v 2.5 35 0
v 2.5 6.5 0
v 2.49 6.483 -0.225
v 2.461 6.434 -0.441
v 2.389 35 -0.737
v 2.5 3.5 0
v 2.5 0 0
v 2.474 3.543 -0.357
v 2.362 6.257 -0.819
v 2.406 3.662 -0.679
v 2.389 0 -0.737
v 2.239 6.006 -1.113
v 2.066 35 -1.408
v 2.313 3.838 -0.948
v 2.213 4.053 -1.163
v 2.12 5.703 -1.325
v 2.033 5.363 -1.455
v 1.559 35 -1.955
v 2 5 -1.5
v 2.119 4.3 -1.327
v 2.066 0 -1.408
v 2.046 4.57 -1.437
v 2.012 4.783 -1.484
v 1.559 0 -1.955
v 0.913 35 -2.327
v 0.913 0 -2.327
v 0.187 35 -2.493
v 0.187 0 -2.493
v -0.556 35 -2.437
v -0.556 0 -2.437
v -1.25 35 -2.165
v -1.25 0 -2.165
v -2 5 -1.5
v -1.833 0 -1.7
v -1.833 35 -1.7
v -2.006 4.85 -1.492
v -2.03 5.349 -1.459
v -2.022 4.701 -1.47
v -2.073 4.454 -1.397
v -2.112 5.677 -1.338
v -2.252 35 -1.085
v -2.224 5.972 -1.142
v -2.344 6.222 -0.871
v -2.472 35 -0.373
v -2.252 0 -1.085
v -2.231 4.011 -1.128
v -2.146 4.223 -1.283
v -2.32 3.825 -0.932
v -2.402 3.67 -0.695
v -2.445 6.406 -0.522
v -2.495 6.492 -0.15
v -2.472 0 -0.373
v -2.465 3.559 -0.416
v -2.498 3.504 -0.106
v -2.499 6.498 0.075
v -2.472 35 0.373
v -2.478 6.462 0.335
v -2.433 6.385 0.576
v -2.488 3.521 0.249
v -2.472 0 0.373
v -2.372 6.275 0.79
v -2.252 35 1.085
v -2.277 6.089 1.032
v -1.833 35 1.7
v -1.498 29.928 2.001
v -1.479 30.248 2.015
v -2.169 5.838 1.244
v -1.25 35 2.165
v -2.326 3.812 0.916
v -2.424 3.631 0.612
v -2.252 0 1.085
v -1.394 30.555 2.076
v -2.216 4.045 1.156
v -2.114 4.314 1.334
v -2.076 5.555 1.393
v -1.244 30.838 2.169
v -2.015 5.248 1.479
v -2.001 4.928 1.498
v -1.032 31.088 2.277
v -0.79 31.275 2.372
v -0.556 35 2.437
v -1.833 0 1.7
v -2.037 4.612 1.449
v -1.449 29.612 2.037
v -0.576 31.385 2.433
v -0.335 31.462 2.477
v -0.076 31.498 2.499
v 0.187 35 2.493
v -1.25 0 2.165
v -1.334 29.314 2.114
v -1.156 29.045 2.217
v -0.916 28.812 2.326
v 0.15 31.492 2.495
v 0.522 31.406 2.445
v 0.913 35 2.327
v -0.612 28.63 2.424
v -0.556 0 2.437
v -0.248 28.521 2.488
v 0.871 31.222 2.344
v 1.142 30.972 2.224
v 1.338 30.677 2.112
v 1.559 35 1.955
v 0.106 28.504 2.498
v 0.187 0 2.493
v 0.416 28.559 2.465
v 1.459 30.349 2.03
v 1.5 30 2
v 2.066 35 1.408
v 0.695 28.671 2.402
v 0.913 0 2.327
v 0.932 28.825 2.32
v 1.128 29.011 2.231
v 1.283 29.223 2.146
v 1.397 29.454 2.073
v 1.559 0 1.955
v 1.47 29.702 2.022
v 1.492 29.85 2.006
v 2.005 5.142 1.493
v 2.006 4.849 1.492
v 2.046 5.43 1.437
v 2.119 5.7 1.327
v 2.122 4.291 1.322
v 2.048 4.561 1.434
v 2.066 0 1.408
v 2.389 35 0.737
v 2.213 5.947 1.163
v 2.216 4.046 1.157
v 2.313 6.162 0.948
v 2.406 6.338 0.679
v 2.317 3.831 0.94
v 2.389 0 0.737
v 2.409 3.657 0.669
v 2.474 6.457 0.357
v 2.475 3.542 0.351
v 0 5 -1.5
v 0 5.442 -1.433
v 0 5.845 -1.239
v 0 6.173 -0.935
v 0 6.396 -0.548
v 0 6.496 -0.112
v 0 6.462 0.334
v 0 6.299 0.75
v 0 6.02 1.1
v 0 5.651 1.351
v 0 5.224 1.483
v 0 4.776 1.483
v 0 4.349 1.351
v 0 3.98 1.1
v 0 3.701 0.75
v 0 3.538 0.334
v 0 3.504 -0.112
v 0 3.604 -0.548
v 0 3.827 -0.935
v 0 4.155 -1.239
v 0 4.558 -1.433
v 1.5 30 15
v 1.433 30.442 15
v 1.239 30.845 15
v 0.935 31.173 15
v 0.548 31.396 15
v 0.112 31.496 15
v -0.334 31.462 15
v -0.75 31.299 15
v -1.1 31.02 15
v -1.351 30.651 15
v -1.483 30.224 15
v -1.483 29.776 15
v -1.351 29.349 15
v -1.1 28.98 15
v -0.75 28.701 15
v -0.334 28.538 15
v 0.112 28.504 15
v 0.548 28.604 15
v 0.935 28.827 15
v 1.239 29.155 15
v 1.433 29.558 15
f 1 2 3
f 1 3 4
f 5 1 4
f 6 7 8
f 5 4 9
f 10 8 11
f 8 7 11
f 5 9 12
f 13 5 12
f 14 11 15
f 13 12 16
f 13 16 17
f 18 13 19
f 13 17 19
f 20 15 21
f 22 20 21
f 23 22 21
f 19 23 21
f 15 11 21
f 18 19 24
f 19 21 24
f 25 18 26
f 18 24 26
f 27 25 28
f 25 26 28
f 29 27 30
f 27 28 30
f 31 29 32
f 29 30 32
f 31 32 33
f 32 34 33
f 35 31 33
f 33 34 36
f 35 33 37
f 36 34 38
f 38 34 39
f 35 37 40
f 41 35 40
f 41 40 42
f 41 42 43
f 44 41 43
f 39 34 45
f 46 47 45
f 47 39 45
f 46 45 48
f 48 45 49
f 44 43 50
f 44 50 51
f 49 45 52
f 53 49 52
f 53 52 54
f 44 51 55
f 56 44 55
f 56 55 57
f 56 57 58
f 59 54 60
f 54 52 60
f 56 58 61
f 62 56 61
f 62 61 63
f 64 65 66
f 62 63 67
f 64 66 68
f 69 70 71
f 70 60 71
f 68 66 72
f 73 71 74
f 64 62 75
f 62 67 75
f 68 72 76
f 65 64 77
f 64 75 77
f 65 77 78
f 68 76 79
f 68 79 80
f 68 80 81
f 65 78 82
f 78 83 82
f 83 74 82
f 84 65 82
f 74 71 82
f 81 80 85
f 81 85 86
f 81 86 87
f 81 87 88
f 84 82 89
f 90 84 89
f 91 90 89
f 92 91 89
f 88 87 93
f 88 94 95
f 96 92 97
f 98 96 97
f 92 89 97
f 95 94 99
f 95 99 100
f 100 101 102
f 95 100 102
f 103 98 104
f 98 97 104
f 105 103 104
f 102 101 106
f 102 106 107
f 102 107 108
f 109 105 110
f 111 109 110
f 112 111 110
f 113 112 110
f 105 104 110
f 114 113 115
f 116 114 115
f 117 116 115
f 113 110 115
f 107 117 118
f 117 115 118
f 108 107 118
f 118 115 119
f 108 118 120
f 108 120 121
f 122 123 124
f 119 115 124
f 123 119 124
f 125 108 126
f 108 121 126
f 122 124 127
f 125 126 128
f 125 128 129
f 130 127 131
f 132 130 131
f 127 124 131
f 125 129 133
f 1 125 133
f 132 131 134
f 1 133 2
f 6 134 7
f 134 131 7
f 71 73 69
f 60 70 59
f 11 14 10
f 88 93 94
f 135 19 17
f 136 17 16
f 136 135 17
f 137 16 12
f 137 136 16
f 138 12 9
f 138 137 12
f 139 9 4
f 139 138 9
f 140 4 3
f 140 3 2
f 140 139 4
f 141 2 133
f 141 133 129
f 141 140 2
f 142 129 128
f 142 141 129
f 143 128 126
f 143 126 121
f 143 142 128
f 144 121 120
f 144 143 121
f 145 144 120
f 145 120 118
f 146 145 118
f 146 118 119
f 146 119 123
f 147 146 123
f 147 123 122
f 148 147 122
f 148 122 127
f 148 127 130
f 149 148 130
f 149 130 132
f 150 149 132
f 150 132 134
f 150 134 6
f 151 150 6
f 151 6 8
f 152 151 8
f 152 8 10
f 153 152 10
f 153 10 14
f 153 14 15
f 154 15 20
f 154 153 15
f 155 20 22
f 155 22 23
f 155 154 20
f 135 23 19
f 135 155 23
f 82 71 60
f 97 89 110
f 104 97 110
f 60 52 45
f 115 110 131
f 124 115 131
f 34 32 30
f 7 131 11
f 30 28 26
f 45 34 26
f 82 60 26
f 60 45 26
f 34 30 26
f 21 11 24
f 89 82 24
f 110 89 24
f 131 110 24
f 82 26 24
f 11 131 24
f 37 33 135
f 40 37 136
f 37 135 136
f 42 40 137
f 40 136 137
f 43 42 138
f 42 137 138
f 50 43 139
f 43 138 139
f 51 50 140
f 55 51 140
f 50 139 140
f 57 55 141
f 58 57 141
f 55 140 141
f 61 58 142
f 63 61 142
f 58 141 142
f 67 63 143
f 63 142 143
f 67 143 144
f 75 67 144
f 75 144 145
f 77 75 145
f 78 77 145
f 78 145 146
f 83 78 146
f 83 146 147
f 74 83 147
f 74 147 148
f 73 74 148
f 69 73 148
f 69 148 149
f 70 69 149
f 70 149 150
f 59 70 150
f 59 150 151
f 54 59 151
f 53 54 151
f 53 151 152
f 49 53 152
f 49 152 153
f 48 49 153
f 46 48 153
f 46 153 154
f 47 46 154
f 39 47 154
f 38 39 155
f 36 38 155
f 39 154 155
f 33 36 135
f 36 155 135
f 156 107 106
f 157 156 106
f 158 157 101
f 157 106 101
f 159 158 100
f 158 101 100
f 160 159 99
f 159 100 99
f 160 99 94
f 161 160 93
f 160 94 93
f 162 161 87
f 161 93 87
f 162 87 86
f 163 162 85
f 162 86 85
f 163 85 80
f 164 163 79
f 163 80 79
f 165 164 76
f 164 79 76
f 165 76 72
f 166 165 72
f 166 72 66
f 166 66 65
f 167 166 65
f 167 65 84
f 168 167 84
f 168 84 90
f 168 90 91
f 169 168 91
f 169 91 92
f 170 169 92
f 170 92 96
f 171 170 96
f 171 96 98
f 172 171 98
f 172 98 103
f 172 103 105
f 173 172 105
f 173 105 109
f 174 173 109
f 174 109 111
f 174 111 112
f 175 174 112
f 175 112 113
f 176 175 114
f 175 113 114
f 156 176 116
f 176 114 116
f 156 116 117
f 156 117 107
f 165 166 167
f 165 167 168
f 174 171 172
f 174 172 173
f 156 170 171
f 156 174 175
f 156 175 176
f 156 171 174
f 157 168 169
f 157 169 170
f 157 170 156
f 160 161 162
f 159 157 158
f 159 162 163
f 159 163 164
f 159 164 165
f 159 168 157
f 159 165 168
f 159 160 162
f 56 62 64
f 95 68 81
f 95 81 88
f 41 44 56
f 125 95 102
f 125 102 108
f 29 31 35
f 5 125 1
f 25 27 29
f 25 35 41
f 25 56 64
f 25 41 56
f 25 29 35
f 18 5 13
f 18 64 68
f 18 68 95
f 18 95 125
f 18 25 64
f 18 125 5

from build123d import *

# Parameters (mm, degrees)
SKETCH1_R               = 2.5
BOSS_EXTRUDE1_DEPTH     = 35
SKETCH2_R               = 1.5
CUT_EXTRUDE1_DEPTH      = 3.5
CUT_EXTRUDE1_DEPTH_BACK = 3.5
SKETCH4_R               = 1.5
BOSS_EXTRUDE3_DEPTH     = 15


with BuildPart() as part:
    # Sketch1 → Boss-Extrude1 (new body)
    with BuildSketch(Plane(origin=(0, 0, 0), x_dir=(1, 0, 0), z_dir=(0, 1, 0))):
        Circle(SKETCH1_R)
    extrude(amount=BOSS_EXTRUDE1_DEPTH)

    # Sketch2 → Cut-Extrude1 (cut, two sides)
    with BuildSketch(Plane(origin=(0, 0, 0), x_dir=(0, 0, -1), z_dir=(1, 0, 0))) as cut_extrude1_sk:
        with Locations((0, 5)):
            Circle(SKETCH2_R)
    extrude(amount=CUT_EXTRUDE1_DEPTH, mode=Mode.SUBTRACT)
    extrude(cut_extrude1_sk.sketch, amount=-CUT_EXTRUDE1_DEPTH_BACK, mode=Mode.SUBTRACT)

    # Sketch4 → Boss-Extrude3 (add)
    with BuildSketch(Plane.XY):
        with Locations((0, 30)):
            Circle(SKETCH4_R)
    extrude(amount=BOSS_EXTRUDE3_DEPTH)


solid = part.part
